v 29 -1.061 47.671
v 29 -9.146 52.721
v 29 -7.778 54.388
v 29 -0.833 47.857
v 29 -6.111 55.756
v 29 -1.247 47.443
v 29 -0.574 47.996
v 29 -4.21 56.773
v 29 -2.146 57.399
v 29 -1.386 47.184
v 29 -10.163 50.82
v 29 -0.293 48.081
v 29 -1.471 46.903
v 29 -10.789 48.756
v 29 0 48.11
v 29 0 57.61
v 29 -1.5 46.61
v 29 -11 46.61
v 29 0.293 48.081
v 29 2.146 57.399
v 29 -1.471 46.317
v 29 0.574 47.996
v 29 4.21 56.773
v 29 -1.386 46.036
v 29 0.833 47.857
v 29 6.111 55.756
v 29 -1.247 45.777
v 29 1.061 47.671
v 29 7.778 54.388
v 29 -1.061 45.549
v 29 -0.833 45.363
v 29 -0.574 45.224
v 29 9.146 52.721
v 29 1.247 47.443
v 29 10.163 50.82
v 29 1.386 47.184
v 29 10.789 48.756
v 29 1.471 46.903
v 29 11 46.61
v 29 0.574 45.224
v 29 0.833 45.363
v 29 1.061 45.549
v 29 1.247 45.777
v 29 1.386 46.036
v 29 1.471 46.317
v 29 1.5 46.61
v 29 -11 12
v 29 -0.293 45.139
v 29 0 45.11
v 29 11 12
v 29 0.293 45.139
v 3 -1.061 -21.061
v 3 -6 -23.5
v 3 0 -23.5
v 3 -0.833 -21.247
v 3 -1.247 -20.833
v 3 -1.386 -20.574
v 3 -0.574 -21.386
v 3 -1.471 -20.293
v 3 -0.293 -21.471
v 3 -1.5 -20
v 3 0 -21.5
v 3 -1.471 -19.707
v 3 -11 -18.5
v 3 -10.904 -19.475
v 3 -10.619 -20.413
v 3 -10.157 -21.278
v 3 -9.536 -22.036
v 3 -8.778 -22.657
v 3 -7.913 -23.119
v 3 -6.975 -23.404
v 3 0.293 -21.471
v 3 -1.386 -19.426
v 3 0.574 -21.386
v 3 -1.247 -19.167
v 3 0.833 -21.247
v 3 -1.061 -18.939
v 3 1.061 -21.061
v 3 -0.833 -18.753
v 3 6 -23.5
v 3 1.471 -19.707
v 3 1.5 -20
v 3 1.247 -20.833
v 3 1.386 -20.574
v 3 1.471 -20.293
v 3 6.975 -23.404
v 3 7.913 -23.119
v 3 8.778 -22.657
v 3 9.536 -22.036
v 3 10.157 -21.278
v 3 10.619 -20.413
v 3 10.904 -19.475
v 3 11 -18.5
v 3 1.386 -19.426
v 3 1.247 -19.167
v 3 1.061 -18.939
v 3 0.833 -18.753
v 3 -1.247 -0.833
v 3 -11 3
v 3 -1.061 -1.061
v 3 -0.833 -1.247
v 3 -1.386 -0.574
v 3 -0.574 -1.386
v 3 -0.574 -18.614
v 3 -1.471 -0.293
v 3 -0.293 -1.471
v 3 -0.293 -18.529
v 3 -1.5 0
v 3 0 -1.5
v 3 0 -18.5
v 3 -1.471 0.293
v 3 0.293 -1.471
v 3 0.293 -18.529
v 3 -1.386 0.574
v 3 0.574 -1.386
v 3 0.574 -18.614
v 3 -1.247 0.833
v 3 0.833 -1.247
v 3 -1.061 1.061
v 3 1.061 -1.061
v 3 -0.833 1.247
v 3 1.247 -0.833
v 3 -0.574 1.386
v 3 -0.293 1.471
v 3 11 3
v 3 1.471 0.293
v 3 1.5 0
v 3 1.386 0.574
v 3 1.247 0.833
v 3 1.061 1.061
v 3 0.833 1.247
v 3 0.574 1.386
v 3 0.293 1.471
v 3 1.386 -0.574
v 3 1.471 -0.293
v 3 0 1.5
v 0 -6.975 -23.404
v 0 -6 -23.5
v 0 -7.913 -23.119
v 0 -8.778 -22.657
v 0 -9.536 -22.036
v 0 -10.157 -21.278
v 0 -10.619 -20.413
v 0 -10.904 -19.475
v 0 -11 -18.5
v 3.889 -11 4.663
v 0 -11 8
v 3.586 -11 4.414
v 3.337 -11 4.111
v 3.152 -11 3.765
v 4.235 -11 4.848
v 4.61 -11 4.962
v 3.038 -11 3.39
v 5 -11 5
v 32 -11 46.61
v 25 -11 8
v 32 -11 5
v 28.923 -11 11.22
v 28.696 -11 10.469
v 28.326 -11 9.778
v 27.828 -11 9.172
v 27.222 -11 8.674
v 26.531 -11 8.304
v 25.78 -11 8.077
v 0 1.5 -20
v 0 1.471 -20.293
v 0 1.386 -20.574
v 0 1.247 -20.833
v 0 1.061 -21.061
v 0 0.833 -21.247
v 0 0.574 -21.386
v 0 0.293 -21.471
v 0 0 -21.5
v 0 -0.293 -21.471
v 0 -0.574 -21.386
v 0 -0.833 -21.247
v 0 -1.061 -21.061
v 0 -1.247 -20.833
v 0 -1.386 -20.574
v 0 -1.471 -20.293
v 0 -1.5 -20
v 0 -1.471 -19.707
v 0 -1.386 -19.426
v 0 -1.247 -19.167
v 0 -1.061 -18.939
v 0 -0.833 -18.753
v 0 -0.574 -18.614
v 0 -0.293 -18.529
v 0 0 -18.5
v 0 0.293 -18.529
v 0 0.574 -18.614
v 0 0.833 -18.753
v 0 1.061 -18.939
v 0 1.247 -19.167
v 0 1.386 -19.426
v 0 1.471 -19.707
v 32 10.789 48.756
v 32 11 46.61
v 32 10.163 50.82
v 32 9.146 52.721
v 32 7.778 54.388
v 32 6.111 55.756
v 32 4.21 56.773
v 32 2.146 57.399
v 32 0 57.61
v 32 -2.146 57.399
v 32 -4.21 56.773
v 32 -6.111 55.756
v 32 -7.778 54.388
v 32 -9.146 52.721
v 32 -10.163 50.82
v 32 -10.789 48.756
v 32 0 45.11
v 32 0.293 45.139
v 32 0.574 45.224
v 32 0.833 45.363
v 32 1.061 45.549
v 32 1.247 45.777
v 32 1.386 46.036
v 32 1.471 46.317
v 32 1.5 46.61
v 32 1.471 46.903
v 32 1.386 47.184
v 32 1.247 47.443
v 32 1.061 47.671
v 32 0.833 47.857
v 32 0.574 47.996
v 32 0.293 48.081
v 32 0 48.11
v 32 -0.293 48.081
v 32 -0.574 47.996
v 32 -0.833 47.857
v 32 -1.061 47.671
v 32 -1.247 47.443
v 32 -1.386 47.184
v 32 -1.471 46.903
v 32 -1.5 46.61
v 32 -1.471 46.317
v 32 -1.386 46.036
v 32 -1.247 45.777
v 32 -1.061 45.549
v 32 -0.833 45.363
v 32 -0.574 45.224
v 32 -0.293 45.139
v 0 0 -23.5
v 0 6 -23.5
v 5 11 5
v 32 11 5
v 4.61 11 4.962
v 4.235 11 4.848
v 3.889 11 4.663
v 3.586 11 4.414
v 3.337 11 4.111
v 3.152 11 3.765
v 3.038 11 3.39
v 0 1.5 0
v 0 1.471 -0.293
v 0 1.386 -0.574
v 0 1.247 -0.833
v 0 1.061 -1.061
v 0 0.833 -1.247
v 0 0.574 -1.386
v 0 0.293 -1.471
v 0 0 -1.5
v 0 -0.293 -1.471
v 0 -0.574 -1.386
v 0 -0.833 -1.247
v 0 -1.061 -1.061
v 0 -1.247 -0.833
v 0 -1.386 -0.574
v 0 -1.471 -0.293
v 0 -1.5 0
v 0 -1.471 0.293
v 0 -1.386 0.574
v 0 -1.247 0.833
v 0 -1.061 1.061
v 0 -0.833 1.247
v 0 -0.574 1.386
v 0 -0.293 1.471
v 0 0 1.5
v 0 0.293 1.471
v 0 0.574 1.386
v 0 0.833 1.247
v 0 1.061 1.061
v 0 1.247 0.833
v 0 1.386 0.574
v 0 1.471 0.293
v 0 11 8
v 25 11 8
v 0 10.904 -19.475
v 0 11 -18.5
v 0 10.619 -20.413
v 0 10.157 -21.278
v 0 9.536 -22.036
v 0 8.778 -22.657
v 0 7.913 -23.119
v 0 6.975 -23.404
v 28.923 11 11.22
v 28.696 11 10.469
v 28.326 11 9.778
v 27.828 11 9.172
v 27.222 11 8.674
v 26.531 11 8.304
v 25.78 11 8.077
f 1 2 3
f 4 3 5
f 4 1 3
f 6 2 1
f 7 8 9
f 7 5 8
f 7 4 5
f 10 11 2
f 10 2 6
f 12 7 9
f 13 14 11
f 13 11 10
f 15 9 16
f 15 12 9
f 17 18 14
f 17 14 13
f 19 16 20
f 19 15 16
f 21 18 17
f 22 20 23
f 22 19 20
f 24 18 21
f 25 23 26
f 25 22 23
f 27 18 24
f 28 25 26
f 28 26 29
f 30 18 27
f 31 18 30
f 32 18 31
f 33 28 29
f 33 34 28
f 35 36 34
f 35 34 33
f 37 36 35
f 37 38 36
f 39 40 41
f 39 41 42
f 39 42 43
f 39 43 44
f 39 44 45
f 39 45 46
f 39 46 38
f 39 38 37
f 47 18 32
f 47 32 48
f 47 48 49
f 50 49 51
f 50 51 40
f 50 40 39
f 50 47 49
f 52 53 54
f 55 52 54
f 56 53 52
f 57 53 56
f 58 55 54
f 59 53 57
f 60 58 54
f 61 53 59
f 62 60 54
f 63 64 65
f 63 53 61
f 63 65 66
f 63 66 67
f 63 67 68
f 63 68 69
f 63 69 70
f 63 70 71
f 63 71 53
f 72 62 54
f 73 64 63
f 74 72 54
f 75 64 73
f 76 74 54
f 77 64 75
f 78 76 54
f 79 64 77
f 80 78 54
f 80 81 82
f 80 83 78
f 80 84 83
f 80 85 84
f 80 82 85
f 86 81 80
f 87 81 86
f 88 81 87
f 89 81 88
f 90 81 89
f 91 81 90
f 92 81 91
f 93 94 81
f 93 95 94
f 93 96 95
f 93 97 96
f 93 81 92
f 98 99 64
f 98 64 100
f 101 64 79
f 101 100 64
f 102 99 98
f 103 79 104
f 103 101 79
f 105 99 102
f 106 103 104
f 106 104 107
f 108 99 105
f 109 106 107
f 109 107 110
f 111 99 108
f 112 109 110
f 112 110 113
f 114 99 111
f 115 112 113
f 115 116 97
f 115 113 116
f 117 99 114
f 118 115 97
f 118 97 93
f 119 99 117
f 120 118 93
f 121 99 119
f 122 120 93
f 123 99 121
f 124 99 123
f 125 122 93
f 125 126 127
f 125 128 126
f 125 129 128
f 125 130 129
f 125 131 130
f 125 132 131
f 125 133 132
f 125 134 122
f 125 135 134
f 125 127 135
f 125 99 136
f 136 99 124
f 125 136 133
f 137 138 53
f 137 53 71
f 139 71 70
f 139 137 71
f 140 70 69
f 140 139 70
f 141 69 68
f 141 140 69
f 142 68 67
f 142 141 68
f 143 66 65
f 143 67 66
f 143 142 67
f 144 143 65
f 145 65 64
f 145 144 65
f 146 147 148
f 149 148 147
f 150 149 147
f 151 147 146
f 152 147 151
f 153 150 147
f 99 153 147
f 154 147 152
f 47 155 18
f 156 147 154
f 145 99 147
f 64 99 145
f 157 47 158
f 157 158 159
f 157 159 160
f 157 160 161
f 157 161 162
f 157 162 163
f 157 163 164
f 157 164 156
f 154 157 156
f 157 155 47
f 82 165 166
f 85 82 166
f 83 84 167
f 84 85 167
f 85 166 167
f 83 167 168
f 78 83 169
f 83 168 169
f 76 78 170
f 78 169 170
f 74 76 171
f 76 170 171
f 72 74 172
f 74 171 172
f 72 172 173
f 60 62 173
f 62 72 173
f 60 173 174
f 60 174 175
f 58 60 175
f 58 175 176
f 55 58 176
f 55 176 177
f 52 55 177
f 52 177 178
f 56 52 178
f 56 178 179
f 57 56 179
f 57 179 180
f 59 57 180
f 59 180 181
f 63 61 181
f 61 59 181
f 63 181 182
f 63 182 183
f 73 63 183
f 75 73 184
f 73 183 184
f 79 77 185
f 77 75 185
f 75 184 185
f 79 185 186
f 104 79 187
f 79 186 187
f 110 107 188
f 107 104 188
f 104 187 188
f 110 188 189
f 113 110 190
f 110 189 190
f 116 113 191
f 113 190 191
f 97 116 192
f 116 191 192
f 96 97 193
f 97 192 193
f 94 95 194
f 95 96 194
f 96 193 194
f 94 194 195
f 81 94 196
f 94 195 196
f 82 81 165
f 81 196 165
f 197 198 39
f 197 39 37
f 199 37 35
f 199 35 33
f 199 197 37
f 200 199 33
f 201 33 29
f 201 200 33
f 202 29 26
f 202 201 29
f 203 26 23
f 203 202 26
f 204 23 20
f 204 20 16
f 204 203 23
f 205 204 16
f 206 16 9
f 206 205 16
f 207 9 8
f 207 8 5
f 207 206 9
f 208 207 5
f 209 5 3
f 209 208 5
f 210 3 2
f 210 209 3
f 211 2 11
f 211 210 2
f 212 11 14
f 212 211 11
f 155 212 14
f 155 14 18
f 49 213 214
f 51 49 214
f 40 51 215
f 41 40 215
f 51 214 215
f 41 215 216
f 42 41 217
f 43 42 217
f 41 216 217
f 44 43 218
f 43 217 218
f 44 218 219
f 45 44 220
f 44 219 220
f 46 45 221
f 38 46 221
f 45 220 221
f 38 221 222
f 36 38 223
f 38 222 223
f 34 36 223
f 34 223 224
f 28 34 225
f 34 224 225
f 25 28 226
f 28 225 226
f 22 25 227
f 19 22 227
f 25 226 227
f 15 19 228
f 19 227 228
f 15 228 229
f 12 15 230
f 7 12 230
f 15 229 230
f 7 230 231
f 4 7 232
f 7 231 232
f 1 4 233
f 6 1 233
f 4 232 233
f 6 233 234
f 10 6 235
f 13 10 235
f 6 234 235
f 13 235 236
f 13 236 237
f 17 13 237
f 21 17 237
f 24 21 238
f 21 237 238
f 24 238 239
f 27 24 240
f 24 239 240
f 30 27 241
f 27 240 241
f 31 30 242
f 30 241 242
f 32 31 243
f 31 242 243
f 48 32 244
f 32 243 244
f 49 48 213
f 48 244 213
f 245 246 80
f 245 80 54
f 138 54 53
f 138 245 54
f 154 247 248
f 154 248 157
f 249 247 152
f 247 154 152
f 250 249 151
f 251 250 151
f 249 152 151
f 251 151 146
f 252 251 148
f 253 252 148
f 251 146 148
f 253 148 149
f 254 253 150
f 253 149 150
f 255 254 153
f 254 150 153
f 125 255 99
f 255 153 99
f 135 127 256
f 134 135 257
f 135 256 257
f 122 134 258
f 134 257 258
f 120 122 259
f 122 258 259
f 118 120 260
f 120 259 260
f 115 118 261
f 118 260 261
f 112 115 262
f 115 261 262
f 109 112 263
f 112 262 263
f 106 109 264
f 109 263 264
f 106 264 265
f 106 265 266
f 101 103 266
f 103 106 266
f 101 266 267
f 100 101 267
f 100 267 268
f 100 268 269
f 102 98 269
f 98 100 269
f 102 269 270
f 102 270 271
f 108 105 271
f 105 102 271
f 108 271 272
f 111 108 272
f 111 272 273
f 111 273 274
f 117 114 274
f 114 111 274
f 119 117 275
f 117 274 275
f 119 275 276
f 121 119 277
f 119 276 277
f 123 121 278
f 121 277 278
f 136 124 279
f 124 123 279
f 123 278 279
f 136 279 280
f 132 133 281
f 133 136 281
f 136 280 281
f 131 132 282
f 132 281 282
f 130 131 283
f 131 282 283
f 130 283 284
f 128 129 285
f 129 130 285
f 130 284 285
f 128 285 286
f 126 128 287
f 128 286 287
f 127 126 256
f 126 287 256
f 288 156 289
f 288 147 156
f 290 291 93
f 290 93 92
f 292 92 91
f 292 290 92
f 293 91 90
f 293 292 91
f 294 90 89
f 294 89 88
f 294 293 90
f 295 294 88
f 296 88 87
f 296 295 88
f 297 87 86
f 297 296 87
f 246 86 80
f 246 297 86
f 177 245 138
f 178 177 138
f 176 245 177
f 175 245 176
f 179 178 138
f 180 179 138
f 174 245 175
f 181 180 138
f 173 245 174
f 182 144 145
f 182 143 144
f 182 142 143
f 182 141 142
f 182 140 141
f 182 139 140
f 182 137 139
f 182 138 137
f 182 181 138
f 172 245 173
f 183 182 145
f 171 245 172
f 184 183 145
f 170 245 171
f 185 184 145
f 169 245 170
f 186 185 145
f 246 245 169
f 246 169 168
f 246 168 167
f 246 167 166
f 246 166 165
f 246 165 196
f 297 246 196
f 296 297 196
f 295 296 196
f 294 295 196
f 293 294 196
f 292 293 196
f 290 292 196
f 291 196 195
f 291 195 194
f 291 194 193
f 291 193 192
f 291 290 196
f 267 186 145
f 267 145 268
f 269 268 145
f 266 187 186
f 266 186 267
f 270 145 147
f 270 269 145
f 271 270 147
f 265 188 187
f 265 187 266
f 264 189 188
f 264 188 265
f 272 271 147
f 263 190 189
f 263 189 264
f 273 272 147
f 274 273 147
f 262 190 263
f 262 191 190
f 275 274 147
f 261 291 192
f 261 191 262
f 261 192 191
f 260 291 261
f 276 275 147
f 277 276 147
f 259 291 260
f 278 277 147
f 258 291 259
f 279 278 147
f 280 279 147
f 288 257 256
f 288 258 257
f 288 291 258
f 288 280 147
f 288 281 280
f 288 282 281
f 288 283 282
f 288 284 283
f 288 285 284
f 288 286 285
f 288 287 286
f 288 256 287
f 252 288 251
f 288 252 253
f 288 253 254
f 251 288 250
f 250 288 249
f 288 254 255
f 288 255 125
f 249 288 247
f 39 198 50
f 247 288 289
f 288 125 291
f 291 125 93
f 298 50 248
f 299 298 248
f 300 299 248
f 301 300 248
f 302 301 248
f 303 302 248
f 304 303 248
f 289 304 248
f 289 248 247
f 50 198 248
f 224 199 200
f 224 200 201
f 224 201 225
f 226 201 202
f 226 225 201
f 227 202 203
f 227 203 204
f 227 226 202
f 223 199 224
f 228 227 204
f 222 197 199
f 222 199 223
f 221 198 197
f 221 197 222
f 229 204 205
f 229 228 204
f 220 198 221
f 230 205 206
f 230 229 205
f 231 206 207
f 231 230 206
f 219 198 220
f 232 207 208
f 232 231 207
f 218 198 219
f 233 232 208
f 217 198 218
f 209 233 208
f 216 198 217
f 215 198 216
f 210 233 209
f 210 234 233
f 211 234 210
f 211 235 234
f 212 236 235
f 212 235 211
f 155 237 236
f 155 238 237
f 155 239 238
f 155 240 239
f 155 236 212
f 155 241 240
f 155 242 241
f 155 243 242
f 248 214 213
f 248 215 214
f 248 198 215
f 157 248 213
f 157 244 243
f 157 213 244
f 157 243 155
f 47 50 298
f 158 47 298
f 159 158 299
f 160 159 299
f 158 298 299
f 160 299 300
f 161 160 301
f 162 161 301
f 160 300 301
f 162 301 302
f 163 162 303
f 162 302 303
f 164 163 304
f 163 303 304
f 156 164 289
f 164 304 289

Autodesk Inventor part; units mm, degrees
ref_plane "YZ Plane" through (0, 0, 0) normal (1, 0, 0) x (0, 1, 0)
ref_plane "XZ Plane" through (0, 0, 0) normal (0, 1, 0) x (-1, 0, 0)
ref_plane "XY Plane" through (0, 0, 0) normal (0, 0, 1) x (1, 0, 0)
sketch "Sketch1" plane through (0, 0, 0) normal (1, 0, 0) x (0, 1, 0)
  circle A0 centre (0, 0) radius 1.5
  circle A1 centre (0, -20) radius 1.5
  line L0 (0, 0) -> (12, 0)
  line L1 (12, 0) -> (12, -20)
  line L2 (0, 0) -> (-12, 0)
  line L3 (-12, 0) -> (-12, -20)
  arc A2 (0, -16.5) -> (0, -23.5) centre (0, -20) ccw
  line L4 (12, -20) -> (12, -23.5)
  line L5 (12, -23.5) -> (-12, -23.5)
  line L6 (-12, -23.5) -> (-12, -20)
  line L7 (0, 0) -> (0, -1.5)
  line L8 (0, -16.5) -> (0, -20)
  line L9 (12, 0) -> (12, 5)
  line L10 (12, 5) -> (-12, 5)
  line L11 (-12, 5) -> (-12, 0)
  dimension "d0" = 3
  dimension "d1" = 20
  dimension "d2" = 3
  dimension "d3" = 12
  dimension "d4" = 12
  dimension "d5" = 7
  dimension "d6" = 5
extrude "Extrusion1" add sketch "Sketch1" along normal blind 3 contours A0 L0 L1 L4 L5 L6 L3 L2 | A0 L2 L11 L10 L9 L0
sketch "Sketch2" plane through (0, 0, 0) normal (-1, 0, 0) x (0, 0, 1)
  line L0 (-23.5, 12) -> (5, 12) projected
  line L1 (-23.5, -12) -> (-23.5, 12) projected
  line L2 (5, -12) -> (-23.5, -12) projected
  line L3 (5, 12) -> (5, -12) projected
  circle A0 centre (-20, 0) radius 1.5 projected
  circle A1 centre (0, 0) radius 1.5 projected
  line L4 (5, 12) -> (5, -12) projected
  line L5 (5, -12) -> (8, -12)
  line L6 (8, -12) -> (8, 12)
  line L7 (-23.5, 12) -> (5, 12) projected
  line L8 (8, 12) -> (5, 12)
  dimension "d9" = 3
extrude "Extrusion2" add sketch "Sketch2" against normal blind 32 contours L8 L6 L5 L3
sketch "Sketch3" plane through (0, -12, 8) normal (0, 0, 1) x (1, 0, 0)
  line L0 (0, 0) -> (0, 24) projected
  line L1 (0, 0) -> (32, 0) projected
  line L2 (32, 24) -> (32, 0) projected
  line L3 (0, 24) -> (32, 24) projected
  line L4 (32, 24) -> (32, 0) projected
  line L5 (32, 0) -> (29, 0)
  line L6 (0, 0) -> (32, 0) projected
  line L7 (29, 0) -> (29, 24)
  line L8 (0, 24) -> (32, 24) projected
  point P0 (0, 12)
  dimension "d12" = 3
extrude "Extrusion3" add sketch "Sketch3" along normal blind 50 contours L7 L3 L2 L1
sketch "Sketch4" plane through (32, 0, 0) normal (1, 0, 0) x (0, 0, -1)
  line L0 (-5, -12) -> (-5, 12) projected
  line L1 (-5, 12) -> (-58, 12) projected
  line L2 (-58, -12) -> (-58, 12) projected
  line L3 (-5, -12) -> (-58, -12) projected
  line L4 (23.5, 12) -> (-5, 12) projected
  line L5 (-5, 12) -> (-5, 0)
  line L6 (-5, -12) -> (-5, 12) projected
  line L7 (-5, 0) -> (-46.61, 0)
  circle A0 centre (-46.61, 0) radius 1.5
  point P0 (0, 0)
  dimension "d15" = 12
  dimension "d16" = 41.61
  dimension "d17" = 3
extrude "Extrusion4" cut sketch "Sketch4" against normal blind 50 contours A0
fillet "Fillet1" radius 2 1 edges at (3, 0, 5)
fillet "Fillet2" radius 4 1 edges at (29, 0, 8)
sketch "Sketch5" plane through (32, 0, 0) normal (1, 0, 0) x (0, 0, -1)
  circle A0 centre (-46.61, 0) radius 1.5 projected
  line L0 (-5, -12) -> (-5, 12) projected
  line L1 (-5, 12) -> (-58, 12) projected
  line L2 (-58, -12) -> (-58, 12) projected
  line L3 (-5, -12) -> (-58, -12) projected
  circle A1 centre (-46.61, 0) radius 1.5 projected
  circle A2 centre (-46.61, 0) radius 11
  line L4 (-3, 12) -> (-5, 12) projected
  line L5 (-5, 12) -> (-5, -12) projected
  line L6 (-5, -12) -> (-3, -12) projected
  line L7 (-3, -12) -> (-3, 12) projected
  line L8 (-3, -12) -> (-3, 12) projected
  line L9 (-3, -12) -> (23.5, -12) projected
  line L10 (23.5, -12) -> (23.5, 12) projected
  line L11 (23.5, 12) -> (-3, 12) projected
  circle A3 centre (20, 0) radius 1.5 projected
  circle A4 centre (0, 0) radius 1.5 projected
  line L12 (-46.61, 11) -> (23.5, 11)
  line L13 (23.5, -12) -> (23.5, 12) projected
  line L14 (-46.61, -11) -> (23.5, -11)
  dimension "d22" = 22
extrude "Extrusion5" cut sketch "Sketch5" against normal through all contours L3 L2 L1 L0 L12 A2 L14 | L0 L14 L7 L6 | L7 L14 L10 L9 | L0 L4 L7 L12 | L7 L11 L10 L12
fillet "Fillet3" radius 5 2 edges at (1.5, -11, -23.5) (1.5, 11, -23.5)
properties part number "acople_2"
